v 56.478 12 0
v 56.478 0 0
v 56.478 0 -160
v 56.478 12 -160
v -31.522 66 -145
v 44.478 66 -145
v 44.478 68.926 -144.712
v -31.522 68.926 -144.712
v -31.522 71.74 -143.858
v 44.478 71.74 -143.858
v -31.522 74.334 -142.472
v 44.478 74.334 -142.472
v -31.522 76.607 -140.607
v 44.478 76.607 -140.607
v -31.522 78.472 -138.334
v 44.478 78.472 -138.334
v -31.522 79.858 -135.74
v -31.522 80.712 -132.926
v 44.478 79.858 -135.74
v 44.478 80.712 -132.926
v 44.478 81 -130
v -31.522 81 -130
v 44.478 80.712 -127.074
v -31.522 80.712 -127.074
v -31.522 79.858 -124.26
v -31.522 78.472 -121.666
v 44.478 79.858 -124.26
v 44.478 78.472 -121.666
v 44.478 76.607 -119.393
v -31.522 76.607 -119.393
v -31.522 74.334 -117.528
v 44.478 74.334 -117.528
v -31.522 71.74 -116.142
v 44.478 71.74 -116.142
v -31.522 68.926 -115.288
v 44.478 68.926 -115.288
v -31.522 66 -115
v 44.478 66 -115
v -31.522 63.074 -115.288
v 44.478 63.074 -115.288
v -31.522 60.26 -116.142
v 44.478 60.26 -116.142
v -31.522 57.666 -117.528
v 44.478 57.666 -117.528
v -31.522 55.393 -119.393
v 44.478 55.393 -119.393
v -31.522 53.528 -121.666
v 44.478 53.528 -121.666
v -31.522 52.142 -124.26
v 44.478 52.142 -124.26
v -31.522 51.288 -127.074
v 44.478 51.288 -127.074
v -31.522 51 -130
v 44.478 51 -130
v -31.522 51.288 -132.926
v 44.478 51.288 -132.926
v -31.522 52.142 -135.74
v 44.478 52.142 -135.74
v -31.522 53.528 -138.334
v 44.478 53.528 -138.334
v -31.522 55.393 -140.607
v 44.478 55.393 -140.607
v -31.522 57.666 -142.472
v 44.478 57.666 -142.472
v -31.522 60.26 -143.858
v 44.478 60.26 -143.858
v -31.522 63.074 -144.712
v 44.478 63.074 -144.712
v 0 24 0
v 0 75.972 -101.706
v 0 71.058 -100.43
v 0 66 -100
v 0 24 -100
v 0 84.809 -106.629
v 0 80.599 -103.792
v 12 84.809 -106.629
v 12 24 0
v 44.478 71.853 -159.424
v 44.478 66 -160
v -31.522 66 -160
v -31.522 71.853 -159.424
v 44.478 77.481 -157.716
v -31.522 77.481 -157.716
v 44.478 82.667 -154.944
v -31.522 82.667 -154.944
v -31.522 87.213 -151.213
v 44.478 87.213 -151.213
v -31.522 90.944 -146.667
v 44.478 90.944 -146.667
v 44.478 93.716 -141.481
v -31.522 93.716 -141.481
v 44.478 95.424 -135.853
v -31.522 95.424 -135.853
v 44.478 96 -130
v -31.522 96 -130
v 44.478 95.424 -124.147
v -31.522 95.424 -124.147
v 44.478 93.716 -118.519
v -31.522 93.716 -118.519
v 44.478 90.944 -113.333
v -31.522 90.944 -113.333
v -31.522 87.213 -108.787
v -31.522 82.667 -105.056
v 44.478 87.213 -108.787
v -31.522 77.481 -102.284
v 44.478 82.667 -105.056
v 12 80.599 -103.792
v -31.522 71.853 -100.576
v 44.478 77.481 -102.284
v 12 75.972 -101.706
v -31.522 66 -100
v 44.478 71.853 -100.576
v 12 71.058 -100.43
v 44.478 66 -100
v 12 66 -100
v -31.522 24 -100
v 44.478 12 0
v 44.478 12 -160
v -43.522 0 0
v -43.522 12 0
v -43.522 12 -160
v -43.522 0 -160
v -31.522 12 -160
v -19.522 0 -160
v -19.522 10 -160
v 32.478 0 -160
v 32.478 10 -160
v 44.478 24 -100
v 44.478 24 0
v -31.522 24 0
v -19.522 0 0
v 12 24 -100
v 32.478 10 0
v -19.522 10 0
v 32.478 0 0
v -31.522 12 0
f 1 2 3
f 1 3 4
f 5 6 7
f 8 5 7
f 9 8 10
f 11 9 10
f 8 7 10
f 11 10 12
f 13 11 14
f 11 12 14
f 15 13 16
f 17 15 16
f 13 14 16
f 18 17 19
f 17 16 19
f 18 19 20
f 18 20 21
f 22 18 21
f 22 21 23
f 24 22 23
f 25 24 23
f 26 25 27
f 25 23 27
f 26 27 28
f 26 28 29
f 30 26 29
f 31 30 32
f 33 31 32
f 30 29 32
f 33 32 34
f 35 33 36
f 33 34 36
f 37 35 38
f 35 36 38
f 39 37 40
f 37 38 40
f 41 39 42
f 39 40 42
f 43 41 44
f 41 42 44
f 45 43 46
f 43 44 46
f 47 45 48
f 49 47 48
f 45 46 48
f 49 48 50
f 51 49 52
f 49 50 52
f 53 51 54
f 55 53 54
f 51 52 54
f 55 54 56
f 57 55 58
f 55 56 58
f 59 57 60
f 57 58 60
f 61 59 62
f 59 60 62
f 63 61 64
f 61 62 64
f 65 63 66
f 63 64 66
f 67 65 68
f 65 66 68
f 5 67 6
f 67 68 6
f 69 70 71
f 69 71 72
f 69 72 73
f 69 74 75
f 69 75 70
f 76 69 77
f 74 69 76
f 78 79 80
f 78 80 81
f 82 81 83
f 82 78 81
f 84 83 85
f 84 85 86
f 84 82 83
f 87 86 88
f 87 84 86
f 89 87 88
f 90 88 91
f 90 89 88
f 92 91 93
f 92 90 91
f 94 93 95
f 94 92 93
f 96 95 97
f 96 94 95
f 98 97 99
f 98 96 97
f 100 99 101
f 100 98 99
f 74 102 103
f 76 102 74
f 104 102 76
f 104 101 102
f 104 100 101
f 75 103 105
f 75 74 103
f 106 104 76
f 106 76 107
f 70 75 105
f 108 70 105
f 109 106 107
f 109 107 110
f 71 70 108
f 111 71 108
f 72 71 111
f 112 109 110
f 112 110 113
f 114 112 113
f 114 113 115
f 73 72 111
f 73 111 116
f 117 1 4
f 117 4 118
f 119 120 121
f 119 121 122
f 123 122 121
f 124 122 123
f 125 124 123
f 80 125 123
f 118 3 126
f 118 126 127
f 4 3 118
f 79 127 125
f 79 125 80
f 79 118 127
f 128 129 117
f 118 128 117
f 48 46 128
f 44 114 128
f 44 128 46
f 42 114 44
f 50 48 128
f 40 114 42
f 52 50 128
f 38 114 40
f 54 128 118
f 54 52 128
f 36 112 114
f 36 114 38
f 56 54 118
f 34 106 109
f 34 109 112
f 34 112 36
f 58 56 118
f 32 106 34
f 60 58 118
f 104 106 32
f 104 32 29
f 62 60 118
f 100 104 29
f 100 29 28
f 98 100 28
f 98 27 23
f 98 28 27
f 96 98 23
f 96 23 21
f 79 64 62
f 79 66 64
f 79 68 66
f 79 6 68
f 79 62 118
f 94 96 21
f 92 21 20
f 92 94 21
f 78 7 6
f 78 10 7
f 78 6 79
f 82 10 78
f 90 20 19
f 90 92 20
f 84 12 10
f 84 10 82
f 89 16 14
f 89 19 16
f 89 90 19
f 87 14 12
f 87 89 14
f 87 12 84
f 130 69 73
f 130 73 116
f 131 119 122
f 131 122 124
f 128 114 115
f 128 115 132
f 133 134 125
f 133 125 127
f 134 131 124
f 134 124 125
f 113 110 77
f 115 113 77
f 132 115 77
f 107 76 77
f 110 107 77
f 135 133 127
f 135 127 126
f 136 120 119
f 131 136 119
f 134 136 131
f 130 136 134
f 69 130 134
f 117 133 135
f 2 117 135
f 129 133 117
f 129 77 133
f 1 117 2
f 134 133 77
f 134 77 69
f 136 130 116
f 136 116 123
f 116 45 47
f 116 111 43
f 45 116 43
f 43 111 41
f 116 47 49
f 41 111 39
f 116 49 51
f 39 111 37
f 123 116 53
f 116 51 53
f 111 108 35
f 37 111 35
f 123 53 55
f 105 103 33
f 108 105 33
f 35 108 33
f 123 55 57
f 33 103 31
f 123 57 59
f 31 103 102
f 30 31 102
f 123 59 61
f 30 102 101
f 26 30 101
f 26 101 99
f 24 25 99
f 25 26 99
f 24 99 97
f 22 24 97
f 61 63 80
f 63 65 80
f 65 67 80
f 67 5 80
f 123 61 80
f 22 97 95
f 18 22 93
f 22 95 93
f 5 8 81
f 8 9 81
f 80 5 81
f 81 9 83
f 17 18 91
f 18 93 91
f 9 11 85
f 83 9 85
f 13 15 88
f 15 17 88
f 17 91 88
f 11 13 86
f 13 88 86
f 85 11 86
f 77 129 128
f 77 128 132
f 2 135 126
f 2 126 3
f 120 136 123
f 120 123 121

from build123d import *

# Parameters (mm, degrees)
BOSS_EXTRUDE1_DEPTH = 160
SKETCH2_R           = 15
BOSS_EXTRUDE2_DEPTH = 76
BOSS_EXTRUDE3_DEPTH = 12


with BuildPart() as part:
    # Sketch1 → Boss-Extrude1 (new body)
    with BuildSketch(Plane.XY):
        Polygon((-43.521594684, 12), (-43.521594684, 0), (-19.521594684, 0), (-19.521594684, 10), (32.478405316, 10), (32.478405316, 0), (56.478405316, 0), (56.478405316, 12), (44.478405316, 12), (44.478405316, 24), (-31.521594684, 24), (-31.521594684, 12), align=None)
    extrude(amount=-BOSS_EXTRUDE1_DEPTH)

    # Sketch2 → Boss-Extrude2 (add)
    with BuildSketch(Plane(origin=(44.478405316, 0, 0), x_dir=(0, 0, -1), z_dir=(1, 0, 0))):
        with BuildLine():
            Line((100, 24), (160, 24))
            Line((160, 24), (160, 66))
            ThreePointArc((160, 66), (130, 96), (100, 66))
            Line((100, 66), (100, 24))
        make_face()
        with Locations((130, 66)):
            Circle(SKETCH2_R, mode=Mode.SUBTRACT)
    extrude(amount=-BOSS_EXTRUDE2_DEPTH)

    # Sketch8 → Boss-Extrude3 (add)
    with BuildSketch(Plane(origin=(0, 0, 0), x_dir=(0, 0, -1), z_dir=(1, 0, 0))):
        Polygon((0, 24), (109.656121138, 86.535715549), (109.656121138, 24), align=None)
    extrude(amount=BOSS_EXTRUDE3_DEPTH)


solid = part.part
